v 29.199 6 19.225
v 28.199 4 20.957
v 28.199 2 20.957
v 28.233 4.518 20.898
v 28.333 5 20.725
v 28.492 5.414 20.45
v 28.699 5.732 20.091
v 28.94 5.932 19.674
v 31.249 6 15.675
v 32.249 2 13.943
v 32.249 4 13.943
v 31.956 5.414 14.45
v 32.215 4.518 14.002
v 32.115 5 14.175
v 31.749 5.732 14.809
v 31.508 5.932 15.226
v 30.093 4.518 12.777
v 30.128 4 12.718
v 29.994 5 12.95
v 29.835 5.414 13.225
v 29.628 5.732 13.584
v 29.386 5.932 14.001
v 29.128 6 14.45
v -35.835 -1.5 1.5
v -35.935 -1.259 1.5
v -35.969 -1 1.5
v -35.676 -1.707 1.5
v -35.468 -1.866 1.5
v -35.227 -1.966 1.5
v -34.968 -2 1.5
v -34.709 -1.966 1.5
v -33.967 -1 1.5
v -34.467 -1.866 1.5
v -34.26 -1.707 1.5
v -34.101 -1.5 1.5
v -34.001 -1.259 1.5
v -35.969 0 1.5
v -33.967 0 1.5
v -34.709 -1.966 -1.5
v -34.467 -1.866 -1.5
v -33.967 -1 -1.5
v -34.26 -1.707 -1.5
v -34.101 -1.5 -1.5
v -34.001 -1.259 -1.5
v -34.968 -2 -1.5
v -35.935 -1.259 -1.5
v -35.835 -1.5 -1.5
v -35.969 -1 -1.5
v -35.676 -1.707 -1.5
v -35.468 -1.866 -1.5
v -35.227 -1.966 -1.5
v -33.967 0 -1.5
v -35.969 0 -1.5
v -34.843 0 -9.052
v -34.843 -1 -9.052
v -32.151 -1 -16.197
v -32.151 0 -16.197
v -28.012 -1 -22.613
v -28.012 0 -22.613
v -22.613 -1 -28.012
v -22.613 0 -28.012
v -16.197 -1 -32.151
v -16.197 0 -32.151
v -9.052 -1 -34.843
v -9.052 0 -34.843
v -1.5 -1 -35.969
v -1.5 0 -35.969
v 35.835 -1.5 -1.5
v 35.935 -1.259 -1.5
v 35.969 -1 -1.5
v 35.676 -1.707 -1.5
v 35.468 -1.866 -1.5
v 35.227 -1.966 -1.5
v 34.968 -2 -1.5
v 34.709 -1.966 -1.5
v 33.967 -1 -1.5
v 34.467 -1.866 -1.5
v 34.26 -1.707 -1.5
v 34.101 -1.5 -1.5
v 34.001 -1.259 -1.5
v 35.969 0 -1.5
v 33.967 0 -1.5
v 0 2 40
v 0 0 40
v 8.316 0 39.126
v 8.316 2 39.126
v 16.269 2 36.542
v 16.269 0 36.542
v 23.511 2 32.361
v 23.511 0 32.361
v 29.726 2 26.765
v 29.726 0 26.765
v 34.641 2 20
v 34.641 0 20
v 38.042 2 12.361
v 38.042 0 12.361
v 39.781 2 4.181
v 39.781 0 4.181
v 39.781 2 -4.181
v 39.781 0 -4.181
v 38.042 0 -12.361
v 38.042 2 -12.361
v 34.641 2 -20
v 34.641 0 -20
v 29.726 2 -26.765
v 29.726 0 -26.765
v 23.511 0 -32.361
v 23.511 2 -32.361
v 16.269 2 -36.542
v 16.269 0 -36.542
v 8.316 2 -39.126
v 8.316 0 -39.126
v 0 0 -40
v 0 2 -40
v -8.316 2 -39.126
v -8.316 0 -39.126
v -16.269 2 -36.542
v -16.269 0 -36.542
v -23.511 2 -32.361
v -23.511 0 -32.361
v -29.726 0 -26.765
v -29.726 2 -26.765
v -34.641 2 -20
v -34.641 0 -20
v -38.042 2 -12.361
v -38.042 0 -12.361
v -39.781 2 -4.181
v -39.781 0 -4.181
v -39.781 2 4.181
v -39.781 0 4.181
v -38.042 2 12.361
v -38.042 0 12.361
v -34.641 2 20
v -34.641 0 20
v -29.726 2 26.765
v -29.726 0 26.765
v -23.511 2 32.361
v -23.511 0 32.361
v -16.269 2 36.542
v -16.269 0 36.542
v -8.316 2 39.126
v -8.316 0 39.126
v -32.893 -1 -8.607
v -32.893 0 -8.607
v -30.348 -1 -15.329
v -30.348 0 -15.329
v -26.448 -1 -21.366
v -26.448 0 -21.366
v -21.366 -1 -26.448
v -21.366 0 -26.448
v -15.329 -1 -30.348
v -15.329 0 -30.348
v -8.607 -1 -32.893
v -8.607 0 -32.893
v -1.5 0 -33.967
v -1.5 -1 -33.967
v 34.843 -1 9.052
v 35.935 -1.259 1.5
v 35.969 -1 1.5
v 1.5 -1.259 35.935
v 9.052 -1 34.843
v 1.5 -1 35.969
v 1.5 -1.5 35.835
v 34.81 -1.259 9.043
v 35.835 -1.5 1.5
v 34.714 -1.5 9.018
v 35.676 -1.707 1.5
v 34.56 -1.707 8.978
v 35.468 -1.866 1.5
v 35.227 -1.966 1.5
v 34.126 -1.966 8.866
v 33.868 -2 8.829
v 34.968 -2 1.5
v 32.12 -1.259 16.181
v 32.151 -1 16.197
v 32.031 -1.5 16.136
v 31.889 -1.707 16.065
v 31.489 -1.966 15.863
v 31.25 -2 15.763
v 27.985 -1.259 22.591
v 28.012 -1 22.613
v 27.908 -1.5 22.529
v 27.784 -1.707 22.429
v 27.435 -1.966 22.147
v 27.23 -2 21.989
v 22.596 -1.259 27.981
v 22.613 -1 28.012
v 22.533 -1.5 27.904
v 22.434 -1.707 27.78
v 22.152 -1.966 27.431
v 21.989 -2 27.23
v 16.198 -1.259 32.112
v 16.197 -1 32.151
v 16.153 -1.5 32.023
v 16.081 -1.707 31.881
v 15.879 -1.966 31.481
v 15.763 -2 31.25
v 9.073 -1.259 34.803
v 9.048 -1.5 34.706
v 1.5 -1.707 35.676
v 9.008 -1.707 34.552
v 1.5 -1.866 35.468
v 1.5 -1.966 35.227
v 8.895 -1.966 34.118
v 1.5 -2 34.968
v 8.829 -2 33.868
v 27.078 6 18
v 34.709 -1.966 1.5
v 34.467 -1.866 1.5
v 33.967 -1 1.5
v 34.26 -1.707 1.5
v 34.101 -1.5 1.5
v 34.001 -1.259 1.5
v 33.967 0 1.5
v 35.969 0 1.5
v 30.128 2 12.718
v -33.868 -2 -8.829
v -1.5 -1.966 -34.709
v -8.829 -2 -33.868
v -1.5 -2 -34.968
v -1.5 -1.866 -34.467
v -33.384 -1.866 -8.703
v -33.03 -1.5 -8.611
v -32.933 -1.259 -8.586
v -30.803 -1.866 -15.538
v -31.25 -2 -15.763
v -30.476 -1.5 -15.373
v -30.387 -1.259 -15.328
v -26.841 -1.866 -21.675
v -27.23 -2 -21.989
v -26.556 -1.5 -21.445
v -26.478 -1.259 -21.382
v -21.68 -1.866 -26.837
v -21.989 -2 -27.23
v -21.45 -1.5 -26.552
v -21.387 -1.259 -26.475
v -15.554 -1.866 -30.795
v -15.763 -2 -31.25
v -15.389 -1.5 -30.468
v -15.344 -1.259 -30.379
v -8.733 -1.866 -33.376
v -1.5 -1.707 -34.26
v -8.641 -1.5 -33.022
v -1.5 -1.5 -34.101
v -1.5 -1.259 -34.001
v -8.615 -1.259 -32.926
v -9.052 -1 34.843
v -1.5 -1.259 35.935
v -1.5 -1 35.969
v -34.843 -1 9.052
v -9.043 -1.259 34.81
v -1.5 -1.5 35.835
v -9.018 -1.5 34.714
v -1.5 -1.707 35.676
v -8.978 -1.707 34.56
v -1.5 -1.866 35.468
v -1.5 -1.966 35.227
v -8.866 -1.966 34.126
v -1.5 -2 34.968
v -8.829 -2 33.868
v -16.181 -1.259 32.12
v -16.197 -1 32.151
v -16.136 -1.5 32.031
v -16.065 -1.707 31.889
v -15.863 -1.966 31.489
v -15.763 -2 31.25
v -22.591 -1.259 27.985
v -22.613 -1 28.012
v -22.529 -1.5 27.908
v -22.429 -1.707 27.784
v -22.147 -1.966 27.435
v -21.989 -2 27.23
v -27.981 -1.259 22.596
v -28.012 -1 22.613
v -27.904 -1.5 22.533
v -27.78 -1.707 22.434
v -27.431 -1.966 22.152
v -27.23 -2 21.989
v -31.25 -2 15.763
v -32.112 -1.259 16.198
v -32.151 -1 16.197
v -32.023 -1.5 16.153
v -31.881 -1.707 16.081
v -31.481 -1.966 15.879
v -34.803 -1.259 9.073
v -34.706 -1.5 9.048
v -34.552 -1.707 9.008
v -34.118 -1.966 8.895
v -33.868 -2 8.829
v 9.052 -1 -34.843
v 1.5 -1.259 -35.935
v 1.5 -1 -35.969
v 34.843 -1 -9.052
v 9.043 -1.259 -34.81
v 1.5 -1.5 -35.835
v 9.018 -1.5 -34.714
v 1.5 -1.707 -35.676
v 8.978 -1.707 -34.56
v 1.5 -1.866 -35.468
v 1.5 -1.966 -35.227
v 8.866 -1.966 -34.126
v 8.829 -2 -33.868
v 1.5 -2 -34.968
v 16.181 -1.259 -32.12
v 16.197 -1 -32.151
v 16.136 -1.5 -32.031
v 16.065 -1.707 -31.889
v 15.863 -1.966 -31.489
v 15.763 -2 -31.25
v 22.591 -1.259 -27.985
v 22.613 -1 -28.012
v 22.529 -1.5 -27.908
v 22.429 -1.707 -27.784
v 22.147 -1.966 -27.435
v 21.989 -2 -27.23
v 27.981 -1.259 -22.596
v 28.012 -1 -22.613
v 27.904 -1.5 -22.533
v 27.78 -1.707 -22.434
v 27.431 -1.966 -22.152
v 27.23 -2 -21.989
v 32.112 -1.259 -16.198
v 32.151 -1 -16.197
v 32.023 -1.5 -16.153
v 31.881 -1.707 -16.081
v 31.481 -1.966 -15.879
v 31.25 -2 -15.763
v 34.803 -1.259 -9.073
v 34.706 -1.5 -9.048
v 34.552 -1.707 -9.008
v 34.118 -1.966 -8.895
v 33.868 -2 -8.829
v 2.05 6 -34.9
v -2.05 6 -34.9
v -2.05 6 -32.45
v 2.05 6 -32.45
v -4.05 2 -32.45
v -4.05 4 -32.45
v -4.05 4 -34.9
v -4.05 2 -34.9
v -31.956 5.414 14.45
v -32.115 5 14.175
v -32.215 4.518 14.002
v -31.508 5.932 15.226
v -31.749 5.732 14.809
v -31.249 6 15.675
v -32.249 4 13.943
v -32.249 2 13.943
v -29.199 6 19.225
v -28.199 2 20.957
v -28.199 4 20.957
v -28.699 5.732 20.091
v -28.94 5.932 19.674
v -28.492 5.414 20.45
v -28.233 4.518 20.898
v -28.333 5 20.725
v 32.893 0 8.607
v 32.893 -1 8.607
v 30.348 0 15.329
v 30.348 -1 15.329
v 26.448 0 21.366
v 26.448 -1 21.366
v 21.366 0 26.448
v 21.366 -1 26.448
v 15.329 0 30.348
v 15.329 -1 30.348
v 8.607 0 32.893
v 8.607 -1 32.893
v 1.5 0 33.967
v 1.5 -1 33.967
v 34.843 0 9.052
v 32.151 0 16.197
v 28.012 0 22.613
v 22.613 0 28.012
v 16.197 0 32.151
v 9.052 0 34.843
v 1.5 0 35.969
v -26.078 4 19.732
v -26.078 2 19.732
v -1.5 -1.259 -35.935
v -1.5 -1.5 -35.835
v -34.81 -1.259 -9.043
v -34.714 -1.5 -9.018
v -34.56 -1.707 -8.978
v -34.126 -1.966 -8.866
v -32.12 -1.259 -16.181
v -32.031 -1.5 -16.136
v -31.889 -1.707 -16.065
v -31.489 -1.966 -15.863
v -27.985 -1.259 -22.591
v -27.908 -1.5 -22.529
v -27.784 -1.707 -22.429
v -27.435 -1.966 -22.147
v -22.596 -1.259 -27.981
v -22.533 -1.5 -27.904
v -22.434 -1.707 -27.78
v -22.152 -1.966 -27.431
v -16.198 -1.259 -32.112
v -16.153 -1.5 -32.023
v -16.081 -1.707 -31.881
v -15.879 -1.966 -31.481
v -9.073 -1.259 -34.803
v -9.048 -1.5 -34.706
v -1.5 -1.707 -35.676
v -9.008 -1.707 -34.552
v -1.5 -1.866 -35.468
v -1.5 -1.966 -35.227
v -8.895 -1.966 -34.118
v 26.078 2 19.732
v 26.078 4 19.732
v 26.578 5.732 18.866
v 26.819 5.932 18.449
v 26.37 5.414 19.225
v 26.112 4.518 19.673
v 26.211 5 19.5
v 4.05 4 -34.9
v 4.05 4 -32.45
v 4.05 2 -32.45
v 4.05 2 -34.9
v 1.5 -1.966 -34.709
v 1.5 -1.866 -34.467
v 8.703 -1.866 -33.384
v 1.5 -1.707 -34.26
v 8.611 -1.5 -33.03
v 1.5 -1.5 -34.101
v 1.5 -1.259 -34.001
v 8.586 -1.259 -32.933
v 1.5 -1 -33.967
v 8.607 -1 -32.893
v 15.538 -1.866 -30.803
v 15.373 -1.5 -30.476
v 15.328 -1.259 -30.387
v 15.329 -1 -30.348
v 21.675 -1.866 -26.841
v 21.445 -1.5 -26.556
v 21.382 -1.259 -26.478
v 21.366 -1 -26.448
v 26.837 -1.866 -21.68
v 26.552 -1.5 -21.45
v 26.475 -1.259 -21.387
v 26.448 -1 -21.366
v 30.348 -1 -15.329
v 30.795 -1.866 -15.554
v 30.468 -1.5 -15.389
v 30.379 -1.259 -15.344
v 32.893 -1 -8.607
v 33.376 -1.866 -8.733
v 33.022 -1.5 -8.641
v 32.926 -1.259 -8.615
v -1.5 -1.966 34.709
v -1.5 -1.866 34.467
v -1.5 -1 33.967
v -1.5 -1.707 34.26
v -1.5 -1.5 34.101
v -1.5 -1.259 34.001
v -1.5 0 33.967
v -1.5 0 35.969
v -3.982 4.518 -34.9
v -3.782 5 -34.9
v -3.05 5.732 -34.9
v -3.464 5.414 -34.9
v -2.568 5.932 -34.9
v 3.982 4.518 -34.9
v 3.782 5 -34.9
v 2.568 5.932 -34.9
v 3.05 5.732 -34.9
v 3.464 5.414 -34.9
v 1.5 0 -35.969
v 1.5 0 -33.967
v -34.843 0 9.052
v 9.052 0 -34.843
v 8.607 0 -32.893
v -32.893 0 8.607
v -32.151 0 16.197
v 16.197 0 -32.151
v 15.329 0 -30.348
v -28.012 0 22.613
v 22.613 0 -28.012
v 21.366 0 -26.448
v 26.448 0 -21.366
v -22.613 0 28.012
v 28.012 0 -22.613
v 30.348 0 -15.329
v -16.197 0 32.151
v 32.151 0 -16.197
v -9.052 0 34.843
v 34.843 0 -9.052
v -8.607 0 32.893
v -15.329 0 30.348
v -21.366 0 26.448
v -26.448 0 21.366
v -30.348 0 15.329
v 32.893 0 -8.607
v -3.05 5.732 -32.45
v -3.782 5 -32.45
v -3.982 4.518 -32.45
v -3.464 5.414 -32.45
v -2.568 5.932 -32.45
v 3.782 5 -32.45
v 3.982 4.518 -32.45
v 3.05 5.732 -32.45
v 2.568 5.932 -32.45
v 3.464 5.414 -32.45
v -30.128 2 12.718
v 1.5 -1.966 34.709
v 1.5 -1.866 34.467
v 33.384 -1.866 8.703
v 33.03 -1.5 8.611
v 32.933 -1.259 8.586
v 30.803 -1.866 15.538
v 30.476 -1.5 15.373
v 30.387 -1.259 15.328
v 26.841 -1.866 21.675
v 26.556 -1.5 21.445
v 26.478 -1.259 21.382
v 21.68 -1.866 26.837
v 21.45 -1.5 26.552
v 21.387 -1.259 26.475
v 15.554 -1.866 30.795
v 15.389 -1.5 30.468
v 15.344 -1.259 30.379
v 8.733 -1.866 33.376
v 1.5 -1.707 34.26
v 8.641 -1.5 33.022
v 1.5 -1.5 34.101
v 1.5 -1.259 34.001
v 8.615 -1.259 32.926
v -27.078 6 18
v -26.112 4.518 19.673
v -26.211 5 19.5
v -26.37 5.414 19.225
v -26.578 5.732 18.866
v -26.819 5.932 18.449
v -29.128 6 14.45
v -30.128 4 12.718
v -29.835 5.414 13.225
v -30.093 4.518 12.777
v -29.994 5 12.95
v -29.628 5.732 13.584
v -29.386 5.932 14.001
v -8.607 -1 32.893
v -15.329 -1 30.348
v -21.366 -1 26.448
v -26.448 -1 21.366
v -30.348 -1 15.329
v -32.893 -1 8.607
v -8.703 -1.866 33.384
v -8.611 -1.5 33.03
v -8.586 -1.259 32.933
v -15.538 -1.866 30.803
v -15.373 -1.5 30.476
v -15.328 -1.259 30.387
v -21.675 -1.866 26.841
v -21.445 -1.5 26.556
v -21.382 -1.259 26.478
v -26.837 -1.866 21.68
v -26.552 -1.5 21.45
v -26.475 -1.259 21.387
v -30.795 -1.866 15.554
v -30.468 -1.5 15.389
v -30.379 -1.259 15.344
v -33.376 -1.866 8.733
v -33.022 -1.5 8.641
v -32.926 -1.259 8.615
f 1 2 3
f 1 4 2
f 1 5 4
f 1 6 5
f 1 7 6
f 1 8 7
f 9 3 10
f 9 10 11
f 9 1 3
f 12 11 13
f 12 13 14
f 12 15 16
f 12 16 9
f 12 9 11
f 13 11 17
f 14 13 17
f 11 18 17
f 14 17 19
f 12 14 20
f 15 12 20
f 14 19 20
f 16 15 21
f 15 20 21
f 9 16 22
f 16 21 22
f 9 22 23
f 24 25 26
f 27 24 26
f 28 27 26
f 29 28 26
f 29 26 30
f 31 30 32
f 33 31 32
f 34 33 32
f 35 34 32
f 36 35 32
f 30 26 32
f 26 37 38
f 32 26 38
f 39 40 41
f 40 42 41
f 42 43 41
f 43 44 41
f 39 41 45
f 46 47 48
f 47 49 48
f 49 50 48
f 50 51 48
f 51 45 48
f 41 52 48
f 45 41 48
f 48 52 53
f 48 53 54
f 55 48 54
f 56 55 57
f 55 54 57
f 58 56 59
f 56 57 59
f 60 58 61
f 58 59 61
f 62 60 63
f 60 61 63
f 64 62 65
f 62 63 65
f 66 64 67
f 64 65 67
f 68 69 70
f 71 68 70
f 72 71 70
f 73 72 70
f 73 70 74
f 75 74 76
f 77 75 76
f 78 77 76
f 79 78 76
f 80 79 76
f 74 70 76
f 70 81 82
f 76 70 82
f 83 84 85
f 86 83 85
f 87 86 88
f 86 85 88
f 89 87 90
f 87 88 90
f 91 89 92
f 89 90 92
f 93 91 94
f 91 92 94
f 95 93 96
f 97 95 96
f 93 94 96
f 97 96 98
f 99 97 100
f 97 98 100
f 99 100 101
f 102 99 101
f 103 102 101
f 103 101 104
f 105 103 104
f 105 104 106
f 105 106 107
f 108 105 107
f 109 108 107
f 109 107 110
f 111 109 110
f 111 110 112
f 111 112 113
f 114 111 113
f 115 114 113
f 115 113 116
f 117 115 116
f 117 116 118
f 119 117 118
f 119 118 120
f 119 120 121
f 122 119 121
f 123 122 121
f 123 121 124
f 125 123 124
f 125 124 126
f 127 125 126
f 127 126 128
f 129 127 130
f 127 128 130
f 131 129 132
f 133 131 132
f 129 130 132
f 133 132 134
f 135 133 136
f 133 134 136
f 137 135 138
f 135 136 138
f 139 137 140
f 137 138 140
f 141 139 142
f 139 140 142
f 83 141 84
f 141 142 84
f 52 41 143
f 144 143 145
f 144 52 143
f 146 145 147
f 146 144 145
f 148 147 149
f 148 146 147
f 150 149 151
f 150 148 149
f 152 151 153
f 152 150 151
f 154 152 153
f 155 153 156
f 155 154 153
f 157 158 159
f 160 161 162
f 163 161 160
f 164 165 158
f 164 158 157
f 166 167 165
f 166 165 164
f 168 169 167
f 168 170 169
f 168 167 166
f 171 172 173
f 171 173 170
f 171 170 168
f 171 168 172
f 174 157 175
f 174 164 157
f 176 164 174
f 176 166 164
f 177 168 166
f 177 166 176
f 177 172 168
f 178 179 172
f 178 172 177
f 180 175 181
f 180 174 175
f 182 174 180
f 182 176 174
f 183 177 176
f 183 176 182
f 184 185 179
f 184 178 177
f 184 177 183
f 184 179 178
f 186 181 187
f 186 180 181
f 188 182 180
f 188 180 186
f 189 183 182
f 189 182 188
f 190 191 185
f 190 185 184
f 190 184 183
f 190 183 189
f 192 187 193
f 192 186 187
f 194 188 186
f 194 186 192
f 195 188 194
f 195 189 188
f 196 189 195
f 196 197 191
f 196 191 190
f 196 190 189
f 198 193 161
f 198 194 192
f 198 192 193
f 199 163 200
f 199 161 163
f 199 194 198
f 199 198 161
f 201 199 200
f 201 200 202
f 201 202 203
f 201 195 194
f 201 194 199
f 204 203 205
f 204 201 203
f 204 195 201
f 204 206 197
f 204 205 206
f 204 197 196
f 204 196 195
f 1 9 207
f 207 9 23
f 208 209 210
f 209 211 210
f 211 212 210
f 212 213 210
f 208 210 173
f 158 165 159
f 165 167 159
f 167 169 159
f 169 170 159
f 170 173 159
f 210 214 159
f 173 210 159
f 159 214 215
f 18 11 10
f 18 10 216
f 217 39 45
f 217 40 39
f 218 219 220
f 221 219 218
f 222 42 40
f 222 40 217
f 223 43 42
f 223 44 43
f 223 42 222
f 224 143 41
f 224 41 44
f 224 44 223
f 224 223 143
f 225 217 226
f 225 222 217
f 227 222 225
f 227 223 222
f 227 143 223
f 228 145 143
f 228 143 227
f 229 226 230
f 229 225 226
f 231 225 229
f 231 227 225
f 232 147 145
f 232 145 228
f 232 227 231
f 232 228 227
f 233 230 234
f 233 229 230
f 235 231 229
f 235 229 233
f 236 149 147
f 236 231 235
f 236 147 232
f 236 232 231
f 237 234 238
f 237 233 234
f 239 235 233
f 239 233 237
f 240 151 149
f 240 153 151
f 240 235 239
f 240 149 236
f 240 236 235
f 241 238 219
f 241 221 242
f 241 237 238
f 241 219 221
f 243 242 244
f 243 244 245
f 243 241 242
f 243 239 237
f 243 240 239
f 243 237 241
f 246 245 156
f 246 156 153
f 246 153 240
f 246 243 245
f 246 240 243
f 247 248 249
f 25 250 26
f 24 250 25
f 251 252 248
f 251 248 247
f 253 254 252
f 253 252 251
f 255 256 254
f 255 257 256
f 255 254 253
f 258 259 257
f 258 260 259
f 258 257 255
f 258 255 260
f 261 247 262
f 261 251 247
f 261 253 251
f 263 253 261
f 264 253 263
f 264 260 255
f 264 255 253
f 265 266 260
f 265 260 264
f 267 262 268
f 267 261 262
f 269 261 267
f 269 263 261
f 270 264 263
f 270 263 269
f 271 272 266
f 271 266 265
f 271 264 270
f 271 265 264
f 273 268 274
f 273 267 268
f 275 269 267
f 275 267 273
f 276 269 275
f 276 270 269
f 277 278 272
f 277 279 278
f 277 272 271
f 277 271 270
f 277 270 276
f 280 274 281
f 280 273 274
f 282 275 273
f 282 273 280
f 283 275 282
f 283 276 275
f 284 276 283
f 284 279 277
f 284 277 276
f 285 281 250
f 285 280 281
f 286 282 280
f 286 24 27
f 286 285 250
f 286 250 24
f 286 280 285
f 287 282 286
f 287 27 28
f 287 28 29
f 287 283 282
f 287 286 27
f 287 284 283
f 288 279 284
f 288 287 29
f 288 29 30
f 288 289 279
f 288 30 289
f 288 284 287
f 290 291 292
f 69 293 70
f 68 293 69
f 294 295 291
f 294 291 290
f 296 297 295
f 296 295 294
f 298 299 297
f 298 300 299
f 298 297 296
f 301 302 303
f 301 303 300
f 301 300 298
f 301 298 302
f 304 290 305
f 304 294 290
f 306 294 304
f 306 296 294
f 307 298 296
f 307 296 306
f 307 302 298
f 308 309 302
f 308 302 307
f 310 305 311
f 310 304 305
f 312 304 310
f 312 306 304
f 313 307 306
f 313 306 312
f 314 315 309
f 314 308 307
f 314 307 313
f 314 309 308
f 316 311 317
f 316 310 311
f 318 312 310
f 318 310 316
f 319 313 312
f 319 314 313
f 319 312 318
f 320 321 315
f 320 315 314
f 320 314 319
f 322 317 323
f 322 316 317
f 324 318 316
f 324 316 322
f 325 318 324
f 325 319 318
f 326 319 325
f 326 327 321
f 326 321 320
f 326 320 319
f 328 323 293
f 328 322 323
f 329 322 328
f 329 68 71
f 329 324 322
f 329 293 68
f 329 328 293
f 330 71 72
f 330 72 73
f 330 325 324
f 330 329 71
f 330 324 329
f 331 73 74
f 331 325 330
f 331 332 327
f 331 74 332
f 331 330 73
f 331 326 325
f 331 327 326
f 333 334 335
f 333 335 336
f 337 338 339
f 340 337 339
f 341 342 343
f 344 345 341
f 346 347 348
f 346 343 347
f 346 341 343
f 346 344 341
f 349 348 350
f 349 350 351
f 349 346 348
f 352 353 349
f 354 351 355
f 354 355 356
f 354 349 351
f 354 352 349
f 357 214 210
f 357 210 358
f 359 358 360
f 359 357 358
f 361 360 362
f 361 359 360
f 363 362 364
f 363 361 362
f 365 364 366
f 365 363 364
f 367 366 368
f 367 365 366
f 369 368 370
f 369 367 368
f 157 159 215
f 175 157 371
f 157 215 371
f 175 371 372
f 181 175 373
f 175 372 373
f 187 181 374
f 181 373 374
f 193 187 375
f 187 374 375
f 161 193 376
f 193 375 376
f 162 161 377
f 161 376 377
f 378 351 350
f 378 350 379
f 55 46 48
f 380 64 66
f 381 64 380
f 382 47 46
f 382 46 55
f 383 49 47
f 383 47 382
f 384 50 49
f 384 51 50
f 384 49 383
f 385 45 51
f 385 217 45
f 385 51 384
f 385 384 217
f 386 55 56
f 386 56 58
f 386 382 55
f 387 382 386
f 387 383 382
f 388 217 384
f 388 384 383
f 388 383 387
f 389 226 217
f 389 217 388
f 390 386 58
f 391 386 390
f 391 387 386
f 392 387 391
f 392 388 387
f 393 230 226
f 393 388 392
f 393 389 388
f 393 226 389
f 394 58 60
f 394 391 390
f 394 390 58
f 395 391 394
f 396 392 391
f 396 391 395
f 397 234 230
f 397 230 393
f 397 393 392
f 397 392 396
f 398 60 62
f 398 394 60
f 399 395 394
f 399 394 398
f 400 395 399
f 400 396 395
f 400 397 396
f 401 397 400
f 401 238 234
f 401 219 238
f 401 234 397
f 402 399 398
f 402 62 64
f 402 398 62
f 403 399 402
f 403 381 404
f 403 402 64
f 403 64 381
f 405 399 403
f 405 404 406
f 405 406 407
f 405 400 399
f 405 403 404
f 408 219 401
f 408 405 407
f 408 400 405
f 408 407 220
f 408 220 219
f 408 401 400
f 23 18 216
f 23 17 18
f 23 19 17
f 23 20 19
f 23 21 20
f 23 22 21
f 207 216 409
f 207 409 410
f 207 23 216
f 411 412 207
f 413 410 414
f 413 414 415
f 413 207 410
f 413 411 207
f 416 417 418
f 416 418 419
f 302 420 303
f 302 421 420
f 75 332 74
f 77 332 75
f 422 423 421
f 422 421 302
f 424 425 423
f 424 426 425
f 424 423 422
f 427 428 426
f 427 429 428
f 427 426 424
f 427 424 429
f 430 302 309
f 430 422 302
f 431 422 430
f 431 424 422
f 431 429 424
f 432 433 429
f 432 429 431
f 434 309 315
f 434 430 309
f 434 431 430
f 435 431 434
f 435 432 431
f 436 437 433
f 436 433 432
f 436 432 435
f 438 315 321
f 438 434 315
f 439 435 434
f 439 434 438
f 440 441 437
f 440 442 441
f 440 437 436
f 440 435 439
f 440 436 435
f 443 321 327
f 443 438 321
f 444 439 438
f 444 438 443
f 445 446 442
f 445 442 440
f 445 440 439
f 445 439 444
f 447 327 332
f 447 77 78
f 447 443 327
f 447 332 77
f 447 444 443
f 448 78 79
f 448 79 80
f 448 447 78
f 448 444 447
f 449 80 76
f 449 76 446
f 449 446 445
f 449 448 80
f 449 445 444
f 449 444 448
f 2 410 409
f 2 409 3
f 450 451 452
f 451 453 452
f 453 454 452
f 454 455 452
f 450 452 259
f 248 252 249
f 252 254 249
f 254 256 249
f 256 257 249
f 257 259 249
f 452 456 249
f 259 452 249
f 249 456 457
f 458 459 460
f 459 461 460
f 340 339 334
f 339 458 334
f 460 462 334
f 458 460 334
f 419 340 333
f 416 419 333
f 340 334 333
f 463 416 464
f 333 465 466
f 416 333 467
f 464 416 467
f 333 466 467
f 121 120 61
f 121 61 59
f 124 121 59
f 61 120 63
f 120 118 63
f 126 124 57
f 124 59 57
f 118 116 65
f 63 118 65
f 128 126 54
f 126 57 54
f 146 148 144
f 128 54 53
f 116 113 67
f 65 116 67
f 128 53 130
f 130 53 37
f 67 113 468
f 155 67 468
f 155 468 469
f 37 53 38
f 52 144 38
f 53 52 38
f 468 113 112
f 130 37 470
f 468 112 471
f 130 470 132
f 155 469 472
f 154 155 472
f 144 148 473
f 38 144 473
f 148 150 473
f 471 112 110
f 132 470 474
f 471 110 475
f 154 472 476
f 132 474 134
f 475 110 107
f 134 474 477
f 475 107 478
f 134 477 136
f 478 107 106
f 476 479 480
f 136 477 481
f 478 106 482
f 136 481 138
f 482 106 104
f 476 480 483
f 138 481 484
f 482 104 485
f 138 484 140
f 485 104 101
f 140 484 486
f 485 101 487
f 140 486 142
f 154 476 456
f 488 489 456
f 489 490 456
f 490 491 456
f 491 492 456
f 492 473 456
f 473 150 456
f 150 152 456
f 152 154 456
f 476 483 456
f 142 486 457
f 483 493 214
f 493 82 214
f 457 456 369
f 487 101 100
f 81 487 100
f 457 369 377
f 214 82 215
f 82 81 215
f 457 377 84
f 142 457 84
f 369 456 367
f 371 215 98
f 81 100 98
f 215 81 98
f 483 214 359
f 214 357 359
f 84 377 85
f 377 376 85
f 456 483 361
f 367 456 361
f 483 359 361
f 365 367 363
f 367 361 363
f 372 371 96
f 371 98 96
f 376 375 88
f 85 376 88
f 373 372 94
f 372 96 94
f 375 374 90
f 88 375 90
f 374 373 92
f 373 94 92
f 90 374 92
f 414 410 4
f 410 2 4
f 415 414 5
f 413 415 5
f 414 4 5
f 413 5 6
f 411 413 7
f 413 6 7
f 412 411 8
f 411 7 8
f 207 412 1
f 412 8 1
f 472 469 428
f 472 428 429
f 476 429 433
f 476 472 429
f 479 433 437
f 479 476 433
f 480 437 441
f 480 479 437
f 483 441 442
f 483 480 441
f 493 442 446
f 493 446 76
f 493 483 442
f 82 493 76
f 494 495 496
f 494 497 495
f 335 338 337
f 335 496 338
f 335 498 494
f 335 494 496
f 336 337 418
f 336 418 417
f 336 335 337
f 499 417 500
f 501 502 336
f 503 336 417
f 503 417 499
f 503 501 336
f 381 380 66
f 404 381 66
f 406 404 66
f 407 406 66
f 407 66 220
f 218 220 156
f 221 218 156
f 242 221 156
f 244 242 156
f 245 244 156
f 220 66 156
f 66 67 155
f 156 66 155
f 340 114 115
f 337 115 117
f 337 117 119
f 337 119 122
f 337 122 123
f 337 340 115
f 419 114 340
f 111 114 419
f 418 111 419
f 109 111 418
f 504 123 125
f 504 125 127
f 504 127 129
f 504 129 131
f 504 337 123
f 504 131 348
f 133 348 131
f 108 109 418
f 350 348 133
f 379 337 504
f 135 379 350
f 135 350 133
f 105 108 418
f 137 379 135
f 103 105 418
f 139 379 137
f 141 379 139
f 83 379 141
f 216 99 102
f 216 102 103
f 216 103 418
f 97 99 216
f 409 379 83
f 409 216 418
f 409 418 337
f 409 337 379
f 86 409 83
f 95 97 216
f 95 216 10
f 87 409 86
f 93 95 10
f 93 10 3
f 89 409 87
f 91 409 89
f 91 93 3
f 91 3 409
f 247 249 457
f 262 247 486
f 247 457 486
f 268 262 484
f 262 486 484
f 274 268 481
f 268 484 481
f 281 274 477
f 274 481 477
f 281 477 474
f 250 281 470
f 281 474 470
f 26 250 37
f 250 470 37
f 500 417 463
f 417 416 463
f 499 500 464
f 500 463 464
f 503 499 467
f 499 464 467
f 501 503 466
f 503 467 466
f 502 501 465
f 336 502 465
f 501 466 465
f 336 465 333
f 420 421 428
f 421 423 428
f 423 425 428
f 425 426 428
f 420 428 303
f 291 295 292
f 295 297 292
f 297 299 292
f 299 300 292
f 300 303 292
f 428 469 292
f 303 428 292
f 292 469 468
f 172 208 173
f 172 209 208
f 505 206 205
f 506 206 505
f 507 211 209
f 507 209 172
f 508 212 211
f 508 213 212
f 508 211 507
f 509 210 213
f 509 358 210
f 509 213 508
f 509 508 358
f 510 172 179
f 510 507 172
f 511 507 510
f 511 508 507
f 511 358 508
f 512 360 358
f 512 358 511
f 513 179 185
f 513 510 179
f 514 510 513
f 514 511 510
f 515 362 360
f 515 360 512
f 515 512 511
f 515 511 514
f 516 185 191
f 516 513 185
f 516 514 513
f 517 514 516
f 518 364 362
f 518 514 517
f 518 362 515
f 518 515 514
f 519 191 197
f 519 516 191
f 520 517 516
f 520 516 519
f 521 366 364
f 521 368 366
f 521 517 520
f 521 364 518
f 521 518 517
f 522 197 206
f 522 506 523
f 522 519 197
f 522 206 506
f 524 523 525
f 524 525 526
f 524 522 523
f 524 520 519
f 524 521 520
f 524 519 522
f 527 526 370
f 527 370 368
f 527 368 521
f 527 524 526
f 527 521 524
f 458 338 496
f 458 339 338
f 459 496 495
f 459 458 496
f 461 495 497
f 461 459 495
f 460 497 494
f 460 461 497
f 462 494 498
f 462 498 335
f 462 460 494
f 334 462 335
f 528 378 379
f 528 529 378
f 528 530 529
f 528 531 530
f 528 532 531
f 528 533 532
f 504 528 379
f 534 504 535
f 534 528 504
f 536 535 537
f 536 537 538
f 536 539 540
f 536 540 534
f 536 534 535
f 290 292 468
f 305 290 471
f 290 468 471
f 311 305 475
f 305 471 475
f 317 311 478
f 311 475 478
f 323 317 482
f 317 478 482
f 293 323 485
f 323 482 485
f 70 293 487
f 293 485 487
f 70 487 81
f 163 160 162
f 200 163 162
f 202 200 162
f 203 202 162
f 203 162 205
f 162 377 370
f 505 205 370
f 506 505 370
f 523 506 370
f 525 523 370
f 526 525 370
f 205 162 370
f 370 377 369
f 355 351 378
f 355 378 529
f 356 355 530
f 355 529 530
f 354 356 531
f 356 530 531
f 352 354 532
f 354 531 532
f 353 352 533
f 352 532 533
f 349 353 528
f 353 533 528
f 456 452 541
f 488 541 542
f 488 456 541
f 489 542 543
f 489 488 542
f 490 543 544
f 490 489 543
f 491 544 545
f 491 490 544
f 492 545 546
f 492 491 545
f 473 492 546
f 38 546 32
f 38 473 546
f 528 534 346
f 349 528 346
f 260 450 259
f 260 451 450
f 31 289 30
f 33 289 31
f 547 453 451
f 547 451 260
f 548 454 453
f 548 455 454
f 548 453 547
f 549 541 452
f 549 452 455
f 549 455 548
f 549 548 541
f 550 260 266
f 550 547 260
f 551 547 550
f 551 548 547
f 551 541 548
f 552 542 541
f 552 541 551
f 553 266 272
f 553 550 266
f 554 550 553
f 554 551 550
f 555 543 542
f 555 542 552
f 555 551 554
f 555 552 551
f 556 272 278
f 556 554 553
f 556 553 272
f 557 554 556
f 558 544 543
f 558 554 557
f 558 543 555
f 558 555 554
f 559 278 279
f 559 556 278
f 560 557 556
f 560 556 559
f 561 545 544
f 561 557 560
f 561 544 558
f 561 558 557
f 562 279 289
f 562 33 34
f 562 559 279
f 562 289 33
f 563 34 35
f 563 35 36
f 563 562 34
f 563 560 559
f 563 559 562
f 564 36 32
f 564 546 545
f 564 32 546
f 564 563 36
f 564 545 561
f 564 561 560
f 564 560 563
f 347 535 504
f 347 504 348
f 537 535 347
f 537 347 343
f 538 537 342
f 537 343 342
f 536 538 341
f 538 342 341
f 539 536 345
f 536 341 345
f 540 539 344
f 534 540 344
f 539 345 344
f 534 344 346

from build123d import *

# Parameters (mm, degrees)
SKETCH1_R           = 40
BOSS_EXTRUDE1_DEPTH = 2
SKETCH2_W           = 8.4
SKETCH2_H           = 2.75
BOSS_EXTRUDE2_DEPTH = 4
SKETCH3_R           = 36
SKETCH3_R_2         = 34
BOSS_EXTRUDE3_DEPTH = 2
FILLET2_R           = 1
CUT_EXTRUDE1_DEPTH  = 2
SKETCH5_W           = 8.4
SKETCH5_H           = 2.75
SKETCH5_W_2         = 8.1
SKETCH5_H_2         = 2.45
CUT_EXTRUDE2_DEPTH  = 4
FILLET3_R           = 2


with BuildPart() as part:
    # Sketch1 → Boss-Extrude1 (new body)
    with BuildSketch(Plane(origin=(0, 0, 0), x_dir=(1, 0, 0), z_dir=(0, 1, 0))):
        with Locations(Location((0, 0, 0), (0, 0, 270))):
            Circle(SKETCH1_R)
    extrude(amount=BOSS_EXTRUDE1_DEPTH)

    # Sketch2 → Boss-Extrude2 (add)
    with BuildSketch(Plane(origin=(0, 2, 0), x_dir=(1, 0, 0), z_dir=(0, 1, 0))):
        with Locations((0, 33.675)):
            Rectangle(SKETCH2_W, SKETCH2_H)
        Polygon((32.454190403, -13.887693304), (28.254190403, -21.162306696), (25.872620542, -19.787306696), (30.072620542, -12.512693304), align=None)
        Polygon((-28.254190403, -21.162306696), (-32.454190403, -13.887693304), (-30.072620542, -12.512693304), (-25.872620542, -19.787306696), align=None)
    extrude(amount=BOSS_EXTRUDE2_DEPTH)

    # Sketch3 → Boss-Extrude3 (add)
    with BuildSketch(Plane.XZ):
        with Locations(Location((0, 0, 0), (0, 0, 90))):
            Circle(SKETCH3_R)
        with Locations(Location((0, 0, 0), (0, 0, 270))):
            Circle(SKETCH3_R_2, mode=Mode.SUBTRACT)
    extrude(amount=BOSS_EXTRUDE3_DEPTH)

    # Fillet2
    fillet2_edges = [part.edges().sort_by_distance(p)[0] for p in [
        (0, -2, -36),
        (0, -2, 34),
    ]]
    fillet(fillet2_edges, radius=FILLET2_R - 0.0001)  # a hair under: the kernel refuses the full size

    # Sketch4 → Cut-Extrude1 (cut)
    with BuildSketch(Plane.XZ):
        Polygon((-1.5, -40), (-1.5, -1.5), (-40, -1.5), (-40, 1.5), (-1.5, 1.5), (-1.5, 40), (1.5, 40), (1.5, 1.5), (40, 1.5), (40, -1.5), (1.5, -1.5), (1.5, -40), align=None)
    extrude(amount=CUT_EXTRUDE1_DEPTH, mode=Mode.SUBTRACT)

    # Sketch5 → Cut-Extrude2 (cut)
    # profile 1 of 3: a face of its own
    with BuildSketch(Plane(origin=(0, 6, 0), x_dir=(1, 0, 0), z_dir=(0, 1, 0))):
        Polygon((32.454190403, -13.887693304), (30.072620542, -12.512693304), (25.872620542, -19.787306696), (28.254190403, -21.162306696), align=None)
        Polygon((32.249286592, -13.942597115), (30.127524353, -12.717597115), (26.077524353, -19.732402885), (28.199286592, -20.957402885), align=None, mode=Mode.SUBTRACT)
    # profile 2 of 3: a face of its own
    with BuildSketch(Plane(origin=(0, 6, 0), x_dir=(1, 0, 0), z_dir=(0, 1, 0))):
        Polygon((-28.254190403, -21.162306696), (-25.872620542, -19.787306696), (-30.072620542, -12.512693304), (-32.454190403, -13.887693304), align=None)
        Polygon((-28.199286592, -20.957402885), (-26.077524353, -19.732402885), (-30.127524353, -12.717597115), (-32.249286592, -13.942597115), align=None, mode=Mode.SUBTRACT)
    # profile 3 of 3: a face of its own
    with BuildSketch(Plane(origin=(0, 6, 0), x_dir=(1, 0, 0), z_dir=(0, 1, 0))):
        with Locations((0, 33.675)):
            Rectangle(SKETCH5_W, SKETCH5_H)
        with Locations((0, 33.675)):
            Rectangle(SKETCH5_W_2, SKETCH5_H_2, mode=Mode.SUBTRACT)
    extrude(amount=-CUT_EXTRUDE2_DEPTH, mode=Mode.SUBTRACT)

    # Fillet3
    fillet3_edges = [part.edges().sort_by_distance(p)[0] for p in [
        (31.188405472, 6, 13.330097115),
        (27.138405472, 6, 20.344902885),
        (-27.138405472, 6, 20.344902885),
        (-31.188405472, 6, 13.330097115),
        (-4.05, 6, -33.675),
        (4.05, 6, -33.675),
    ]]
    fillet(fillet3_edges, radius=FILLET3_R)


solid = part.part
